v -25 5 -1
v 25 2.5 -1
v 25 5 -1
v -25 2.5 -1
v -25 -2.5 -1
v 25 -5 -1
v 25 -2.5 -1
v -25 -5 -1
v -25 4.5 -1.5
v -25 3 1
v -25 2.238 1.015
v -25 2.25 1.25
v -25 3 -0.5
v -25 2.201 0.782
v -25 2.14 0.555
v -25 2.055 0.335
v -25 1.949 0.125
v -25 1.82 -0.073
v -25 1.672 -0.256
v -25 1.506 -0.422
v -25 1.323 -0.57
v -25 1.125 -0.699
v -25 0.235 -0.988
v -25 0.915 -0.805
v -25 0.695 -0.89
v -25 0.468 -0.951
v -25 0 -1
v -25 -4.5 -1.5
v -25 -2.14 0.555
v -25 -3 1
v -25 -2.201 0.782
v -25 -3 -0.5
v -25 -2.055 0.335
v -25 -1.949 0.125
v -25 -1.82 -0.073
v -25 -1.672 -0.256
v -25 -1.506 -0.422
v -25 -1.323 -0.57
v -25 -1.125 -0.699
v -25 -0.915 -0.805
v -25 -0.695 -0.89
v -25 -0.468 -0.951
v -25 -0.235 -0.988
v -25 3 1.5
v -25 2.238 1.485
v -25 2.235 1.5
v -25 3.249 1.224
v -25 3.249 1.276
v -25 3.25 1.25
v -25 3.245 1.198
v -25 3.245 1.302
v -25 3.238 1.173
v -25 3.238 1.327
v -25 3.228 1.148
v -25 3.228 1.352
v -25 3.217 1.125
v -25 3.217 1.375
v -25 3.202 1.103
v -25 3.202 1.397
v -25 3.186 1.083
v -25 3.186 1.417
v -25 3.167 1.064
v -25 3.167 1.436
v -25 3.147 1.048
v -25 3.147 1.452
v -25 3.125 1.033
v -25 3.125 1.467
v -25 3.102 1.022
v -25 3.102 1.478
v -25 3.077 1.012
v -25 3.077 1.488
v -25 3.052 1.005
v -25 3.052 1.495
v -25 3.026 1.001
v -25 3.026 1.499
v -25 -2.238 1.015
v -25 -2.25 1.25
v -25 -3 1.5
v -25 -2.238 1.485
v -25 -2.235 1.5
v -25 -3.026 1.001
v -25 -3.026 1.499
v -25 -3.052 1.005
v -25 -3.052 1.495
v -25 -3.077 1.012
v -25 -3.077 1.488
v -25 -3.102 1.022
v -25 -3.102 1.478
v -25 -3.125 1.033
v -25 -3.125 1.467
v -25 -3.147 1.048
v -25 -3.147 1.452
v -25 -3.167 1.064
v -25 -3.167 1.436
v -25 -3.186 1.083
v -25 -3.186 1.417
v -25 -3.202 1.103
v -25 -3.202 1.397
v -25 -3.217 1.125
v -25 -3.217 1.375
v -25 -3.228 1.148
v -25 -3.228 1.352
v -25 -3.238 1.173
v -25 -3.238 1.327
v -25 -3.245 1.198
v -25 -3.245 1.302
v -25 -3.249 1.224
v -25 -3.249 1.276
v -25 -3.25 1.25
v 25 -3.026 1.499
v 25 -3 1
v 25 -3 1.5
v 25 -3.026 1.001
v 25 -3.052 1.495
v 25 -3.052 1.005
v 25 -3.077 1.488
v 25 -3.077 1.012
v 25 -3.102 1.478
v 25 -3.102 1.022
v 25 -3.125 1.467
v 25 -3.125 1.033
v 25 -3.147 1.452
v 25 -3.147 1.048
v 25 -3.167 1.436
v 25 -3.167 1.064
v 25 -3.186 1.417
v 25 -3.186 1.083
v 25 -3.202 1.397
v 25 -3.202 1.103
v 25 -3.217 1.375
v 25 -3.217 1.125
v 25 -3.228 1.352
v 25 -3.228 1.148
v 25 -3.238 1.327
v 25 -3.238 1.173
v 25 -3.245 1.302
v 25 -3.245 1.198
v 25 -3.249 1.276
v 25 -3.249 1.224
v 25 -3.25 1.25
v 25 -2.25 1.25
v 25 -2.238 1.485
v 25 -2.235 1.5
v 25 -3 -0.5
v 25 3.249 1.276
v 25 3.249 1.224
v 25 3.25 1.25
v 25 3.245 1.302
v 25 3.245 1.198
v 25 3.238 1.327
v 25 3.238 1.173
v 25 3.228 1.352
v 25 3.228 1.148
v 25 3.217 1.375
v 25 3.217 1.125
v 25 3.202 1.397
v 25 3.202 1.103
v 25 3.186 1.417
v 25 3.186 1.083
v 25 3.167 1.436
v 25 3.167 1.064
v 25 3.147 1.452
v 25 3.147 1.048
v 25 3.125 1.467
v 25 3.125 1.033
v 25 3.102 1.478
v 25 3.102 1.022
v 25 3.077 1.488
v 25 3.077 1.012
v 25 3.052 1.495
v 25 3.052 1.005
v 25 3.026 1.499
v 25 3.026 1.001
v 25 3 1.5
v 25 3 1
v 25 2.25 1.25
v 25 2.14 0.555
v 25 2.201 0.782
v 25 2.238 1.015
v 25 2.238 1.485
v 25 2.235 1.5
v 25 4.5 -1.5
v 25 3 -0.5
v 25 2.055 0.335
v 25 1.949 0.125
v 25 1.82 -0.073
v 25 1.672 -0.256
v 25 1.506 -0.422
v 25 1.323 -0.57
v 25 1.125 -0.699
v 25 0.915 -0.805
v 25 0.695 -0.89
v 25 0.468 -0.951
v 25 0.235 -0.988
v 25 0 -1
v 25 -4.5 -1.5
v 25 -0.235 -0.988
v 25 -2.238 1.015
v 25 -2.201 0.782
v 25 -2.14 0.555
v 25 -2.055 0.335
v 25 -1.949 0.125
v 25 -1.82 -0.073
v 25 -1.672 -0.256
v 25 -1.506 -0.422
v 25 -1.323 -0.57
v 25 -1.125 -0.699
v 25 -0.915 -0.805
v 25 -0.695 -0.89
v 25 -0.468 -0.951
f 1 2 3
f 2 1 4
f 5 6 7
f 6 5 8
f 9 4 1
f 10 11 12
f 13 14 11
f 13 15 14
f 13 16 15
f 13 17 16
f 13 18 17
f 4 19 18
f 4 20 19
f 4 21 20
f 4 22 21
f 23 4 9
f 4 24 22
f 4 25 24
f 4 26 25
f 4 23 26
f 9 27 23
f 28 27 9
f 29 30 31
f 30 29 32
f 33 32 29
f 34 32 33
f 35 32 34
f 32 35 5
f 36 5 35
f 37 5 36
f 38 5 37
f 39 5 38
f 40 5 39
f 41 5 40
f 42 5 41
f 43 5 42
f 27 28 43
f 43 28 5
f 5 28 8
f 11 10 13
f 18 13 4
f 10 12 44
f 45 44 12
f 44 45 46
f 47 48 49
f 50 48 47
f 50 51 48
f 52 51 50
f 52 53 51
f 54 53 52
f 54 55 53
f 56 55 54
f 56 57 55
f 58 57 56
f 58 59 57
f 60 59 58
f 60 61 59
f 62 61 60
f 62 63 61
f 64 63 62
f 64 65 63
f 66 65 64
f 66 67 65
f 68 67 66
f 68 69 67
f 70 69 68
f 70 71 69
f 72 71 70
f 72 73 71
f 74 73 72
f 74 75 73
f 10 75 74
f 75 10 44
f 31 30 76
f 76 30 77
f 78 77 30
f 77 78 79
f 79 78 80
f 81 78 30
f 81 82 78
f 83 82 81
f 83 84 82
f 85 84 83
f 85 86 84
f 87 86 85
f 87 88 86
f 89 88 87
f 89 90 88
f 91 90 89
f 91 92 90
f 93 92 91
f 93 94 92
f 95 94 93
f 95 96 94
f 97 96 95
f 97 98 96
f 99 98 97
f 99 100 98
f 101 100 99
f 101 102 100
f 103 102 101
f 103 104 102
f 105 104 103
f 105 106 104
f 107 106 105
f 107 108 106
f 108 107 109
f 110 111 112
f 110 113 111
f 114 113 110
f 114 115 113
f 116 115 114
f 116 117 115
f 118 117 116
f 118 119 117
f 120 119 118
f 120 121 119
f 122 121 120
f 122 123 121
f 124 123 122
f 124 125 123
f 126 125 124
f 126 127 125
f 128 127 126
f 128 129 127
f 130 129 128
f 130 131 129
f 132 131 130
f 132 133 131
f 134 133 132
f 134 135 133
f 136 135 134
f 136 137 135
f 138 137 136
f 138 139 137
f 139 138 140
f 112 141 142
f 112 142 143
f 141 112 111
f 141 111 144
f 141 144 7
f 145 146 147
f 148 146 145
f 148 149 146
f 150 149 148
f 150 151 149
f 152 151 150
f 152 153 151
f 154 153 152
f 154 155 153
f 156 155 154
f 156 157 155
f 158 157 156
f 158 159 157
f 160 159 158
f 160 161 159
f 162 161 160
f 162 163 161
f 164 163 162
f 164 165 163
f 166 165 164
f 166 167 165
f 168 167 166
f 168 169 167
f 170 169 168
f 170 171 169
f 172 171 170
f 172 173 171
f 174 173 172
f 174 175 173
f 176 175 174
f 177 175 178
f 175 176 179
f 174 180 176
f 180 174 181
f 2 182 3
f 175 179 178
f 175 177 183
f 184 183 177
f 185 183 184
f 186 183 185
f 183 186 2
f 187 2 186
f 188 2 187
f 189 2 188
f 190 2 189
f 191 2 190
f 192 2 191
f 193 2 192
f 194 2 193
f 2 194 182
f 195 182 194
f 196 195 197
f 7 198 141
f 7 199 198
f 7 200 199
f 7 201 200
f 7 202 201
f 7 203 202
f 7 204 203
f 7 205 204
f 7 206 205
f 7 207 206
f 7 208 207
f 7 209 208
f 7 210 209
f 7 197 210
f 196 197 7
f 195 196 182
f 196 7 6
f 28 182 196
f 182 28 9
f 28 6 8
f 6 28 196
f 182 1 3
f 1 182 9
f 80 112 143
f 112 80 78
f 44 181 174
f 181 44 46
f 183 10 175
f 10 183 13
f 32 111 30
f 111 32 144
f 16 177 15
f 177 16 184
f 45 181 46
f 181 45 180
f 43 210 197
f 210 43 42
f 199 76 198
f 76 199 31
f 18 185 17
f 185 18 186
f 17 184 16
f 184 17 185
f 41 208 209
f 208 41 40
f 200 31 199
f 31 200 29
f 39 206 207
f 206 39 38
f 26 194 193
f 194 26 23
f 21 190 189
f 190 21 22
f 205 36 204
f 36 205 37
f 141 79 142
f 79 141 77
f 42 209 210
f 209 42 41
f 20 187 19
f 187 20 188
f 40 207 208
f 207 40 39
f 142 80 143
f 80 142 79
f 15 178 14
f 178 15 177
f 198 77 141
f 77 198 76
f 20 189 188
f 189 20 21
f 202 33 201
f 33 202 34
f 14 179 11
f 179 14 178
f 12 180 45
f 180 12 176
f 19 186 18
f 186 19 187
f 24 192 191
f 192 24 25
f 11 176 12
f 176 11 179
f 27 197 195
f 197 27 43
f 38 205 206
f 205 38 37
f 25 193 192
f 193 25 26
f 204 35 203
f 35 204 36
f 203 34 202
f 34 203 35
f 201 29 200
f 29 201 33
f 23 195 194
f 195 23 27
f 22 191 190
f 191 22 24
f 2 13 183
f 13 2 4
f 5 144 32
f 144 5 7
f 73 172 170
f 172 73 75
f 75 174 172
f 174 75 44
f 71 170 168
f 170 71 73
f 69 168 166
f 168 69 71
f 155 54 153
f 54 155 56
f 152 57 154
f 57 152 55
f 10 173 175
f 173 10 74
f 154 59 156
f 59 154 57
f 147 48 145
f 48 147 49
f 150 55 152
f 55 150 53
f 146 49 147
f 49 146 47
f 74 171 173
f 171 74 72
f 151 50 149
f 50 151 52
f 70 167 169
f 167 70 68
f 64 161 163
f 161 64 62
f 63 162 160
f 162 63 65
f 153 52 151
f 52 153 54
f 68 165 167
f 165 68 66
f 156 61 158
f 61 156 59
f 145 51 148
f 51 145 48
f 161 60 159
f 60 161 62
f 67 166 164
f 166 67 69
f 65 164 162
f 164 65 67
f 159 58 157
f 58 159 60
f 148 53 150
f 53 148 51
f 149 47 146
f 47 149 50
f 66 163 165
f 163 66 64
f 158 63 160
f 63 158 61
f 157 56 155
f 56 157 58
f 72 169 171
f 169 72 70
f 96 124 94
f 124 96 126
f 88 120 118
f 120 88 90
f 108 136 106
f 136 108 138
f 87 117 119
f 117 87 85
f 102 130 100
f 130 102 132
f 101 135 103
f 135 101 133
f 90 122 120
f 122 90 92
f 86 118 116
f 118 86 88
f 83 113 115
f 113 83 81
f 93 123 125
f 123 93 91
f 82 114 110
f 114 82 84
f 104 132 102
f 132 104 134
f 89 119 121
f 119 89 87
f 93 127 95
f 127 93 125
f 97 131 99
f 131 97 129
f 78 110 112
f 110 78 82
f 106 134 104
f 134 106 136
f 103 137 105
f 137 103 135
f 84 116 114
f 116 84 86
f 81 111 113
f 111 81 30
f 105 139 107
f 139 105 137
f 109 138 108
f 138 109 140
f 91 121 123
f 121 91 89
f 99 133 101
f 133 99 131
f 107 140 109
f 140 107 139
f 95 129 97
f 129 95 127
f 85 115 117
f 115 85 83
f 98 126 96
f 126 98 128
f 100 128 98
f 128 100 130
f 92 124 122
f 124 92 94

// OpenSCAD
$fn=60;

module prism(l, w, h){
       polyhedron(
               points=[[0,0,0], [l,0,0], [l,w,0], [0,w,0], [0,w,h], [l,w,h]],
               faces=[[0,1,2,3],[5,4,3,2],[0,4,5,1],[0,3,4],[5,2,1]]
               );
       
       }

// This is a bit of a mess but it works for a 20x20 extrusion
// will port it to the BOSL library when I get a chance
module wire_cover(length) {
    rotate([0,-90,0])
    {
    difference() {
        translate([-1.25,0,0]) cube([0.5,10,length],center=true);
        
        translate([1.5,-7.5,(length+2)/2])
        rotate([0,90,90])
        prism(length+2, 3, 3);

        translate([-1.5,4.5,(length+2)/2])
        rotate([0,90,0])
        prism(length+2, 3, 3);
    }

    difference() {
        cube([3,6,length] ,center=true);
        translate([1.25,0,0]) cylinder(length+2,2.25,2.25,center=true);
        
        translate([-1,2.5,(length+2)/2])
        rotate([0,90,0])
        prism(length+2, 3, 3);

        translate([2,-5.5,(length+2)/2])
        rotate([0,90,90])
        prism(length+2, 3, 3);
    }
       
     translate([1.25,3,0]) cylinder(length,0.25,0.25, center=true);
     translate([1.25,-3,0]) cylinder(length,0.25,0.25, center=true);
     
     }
}

wire_cover(50);
